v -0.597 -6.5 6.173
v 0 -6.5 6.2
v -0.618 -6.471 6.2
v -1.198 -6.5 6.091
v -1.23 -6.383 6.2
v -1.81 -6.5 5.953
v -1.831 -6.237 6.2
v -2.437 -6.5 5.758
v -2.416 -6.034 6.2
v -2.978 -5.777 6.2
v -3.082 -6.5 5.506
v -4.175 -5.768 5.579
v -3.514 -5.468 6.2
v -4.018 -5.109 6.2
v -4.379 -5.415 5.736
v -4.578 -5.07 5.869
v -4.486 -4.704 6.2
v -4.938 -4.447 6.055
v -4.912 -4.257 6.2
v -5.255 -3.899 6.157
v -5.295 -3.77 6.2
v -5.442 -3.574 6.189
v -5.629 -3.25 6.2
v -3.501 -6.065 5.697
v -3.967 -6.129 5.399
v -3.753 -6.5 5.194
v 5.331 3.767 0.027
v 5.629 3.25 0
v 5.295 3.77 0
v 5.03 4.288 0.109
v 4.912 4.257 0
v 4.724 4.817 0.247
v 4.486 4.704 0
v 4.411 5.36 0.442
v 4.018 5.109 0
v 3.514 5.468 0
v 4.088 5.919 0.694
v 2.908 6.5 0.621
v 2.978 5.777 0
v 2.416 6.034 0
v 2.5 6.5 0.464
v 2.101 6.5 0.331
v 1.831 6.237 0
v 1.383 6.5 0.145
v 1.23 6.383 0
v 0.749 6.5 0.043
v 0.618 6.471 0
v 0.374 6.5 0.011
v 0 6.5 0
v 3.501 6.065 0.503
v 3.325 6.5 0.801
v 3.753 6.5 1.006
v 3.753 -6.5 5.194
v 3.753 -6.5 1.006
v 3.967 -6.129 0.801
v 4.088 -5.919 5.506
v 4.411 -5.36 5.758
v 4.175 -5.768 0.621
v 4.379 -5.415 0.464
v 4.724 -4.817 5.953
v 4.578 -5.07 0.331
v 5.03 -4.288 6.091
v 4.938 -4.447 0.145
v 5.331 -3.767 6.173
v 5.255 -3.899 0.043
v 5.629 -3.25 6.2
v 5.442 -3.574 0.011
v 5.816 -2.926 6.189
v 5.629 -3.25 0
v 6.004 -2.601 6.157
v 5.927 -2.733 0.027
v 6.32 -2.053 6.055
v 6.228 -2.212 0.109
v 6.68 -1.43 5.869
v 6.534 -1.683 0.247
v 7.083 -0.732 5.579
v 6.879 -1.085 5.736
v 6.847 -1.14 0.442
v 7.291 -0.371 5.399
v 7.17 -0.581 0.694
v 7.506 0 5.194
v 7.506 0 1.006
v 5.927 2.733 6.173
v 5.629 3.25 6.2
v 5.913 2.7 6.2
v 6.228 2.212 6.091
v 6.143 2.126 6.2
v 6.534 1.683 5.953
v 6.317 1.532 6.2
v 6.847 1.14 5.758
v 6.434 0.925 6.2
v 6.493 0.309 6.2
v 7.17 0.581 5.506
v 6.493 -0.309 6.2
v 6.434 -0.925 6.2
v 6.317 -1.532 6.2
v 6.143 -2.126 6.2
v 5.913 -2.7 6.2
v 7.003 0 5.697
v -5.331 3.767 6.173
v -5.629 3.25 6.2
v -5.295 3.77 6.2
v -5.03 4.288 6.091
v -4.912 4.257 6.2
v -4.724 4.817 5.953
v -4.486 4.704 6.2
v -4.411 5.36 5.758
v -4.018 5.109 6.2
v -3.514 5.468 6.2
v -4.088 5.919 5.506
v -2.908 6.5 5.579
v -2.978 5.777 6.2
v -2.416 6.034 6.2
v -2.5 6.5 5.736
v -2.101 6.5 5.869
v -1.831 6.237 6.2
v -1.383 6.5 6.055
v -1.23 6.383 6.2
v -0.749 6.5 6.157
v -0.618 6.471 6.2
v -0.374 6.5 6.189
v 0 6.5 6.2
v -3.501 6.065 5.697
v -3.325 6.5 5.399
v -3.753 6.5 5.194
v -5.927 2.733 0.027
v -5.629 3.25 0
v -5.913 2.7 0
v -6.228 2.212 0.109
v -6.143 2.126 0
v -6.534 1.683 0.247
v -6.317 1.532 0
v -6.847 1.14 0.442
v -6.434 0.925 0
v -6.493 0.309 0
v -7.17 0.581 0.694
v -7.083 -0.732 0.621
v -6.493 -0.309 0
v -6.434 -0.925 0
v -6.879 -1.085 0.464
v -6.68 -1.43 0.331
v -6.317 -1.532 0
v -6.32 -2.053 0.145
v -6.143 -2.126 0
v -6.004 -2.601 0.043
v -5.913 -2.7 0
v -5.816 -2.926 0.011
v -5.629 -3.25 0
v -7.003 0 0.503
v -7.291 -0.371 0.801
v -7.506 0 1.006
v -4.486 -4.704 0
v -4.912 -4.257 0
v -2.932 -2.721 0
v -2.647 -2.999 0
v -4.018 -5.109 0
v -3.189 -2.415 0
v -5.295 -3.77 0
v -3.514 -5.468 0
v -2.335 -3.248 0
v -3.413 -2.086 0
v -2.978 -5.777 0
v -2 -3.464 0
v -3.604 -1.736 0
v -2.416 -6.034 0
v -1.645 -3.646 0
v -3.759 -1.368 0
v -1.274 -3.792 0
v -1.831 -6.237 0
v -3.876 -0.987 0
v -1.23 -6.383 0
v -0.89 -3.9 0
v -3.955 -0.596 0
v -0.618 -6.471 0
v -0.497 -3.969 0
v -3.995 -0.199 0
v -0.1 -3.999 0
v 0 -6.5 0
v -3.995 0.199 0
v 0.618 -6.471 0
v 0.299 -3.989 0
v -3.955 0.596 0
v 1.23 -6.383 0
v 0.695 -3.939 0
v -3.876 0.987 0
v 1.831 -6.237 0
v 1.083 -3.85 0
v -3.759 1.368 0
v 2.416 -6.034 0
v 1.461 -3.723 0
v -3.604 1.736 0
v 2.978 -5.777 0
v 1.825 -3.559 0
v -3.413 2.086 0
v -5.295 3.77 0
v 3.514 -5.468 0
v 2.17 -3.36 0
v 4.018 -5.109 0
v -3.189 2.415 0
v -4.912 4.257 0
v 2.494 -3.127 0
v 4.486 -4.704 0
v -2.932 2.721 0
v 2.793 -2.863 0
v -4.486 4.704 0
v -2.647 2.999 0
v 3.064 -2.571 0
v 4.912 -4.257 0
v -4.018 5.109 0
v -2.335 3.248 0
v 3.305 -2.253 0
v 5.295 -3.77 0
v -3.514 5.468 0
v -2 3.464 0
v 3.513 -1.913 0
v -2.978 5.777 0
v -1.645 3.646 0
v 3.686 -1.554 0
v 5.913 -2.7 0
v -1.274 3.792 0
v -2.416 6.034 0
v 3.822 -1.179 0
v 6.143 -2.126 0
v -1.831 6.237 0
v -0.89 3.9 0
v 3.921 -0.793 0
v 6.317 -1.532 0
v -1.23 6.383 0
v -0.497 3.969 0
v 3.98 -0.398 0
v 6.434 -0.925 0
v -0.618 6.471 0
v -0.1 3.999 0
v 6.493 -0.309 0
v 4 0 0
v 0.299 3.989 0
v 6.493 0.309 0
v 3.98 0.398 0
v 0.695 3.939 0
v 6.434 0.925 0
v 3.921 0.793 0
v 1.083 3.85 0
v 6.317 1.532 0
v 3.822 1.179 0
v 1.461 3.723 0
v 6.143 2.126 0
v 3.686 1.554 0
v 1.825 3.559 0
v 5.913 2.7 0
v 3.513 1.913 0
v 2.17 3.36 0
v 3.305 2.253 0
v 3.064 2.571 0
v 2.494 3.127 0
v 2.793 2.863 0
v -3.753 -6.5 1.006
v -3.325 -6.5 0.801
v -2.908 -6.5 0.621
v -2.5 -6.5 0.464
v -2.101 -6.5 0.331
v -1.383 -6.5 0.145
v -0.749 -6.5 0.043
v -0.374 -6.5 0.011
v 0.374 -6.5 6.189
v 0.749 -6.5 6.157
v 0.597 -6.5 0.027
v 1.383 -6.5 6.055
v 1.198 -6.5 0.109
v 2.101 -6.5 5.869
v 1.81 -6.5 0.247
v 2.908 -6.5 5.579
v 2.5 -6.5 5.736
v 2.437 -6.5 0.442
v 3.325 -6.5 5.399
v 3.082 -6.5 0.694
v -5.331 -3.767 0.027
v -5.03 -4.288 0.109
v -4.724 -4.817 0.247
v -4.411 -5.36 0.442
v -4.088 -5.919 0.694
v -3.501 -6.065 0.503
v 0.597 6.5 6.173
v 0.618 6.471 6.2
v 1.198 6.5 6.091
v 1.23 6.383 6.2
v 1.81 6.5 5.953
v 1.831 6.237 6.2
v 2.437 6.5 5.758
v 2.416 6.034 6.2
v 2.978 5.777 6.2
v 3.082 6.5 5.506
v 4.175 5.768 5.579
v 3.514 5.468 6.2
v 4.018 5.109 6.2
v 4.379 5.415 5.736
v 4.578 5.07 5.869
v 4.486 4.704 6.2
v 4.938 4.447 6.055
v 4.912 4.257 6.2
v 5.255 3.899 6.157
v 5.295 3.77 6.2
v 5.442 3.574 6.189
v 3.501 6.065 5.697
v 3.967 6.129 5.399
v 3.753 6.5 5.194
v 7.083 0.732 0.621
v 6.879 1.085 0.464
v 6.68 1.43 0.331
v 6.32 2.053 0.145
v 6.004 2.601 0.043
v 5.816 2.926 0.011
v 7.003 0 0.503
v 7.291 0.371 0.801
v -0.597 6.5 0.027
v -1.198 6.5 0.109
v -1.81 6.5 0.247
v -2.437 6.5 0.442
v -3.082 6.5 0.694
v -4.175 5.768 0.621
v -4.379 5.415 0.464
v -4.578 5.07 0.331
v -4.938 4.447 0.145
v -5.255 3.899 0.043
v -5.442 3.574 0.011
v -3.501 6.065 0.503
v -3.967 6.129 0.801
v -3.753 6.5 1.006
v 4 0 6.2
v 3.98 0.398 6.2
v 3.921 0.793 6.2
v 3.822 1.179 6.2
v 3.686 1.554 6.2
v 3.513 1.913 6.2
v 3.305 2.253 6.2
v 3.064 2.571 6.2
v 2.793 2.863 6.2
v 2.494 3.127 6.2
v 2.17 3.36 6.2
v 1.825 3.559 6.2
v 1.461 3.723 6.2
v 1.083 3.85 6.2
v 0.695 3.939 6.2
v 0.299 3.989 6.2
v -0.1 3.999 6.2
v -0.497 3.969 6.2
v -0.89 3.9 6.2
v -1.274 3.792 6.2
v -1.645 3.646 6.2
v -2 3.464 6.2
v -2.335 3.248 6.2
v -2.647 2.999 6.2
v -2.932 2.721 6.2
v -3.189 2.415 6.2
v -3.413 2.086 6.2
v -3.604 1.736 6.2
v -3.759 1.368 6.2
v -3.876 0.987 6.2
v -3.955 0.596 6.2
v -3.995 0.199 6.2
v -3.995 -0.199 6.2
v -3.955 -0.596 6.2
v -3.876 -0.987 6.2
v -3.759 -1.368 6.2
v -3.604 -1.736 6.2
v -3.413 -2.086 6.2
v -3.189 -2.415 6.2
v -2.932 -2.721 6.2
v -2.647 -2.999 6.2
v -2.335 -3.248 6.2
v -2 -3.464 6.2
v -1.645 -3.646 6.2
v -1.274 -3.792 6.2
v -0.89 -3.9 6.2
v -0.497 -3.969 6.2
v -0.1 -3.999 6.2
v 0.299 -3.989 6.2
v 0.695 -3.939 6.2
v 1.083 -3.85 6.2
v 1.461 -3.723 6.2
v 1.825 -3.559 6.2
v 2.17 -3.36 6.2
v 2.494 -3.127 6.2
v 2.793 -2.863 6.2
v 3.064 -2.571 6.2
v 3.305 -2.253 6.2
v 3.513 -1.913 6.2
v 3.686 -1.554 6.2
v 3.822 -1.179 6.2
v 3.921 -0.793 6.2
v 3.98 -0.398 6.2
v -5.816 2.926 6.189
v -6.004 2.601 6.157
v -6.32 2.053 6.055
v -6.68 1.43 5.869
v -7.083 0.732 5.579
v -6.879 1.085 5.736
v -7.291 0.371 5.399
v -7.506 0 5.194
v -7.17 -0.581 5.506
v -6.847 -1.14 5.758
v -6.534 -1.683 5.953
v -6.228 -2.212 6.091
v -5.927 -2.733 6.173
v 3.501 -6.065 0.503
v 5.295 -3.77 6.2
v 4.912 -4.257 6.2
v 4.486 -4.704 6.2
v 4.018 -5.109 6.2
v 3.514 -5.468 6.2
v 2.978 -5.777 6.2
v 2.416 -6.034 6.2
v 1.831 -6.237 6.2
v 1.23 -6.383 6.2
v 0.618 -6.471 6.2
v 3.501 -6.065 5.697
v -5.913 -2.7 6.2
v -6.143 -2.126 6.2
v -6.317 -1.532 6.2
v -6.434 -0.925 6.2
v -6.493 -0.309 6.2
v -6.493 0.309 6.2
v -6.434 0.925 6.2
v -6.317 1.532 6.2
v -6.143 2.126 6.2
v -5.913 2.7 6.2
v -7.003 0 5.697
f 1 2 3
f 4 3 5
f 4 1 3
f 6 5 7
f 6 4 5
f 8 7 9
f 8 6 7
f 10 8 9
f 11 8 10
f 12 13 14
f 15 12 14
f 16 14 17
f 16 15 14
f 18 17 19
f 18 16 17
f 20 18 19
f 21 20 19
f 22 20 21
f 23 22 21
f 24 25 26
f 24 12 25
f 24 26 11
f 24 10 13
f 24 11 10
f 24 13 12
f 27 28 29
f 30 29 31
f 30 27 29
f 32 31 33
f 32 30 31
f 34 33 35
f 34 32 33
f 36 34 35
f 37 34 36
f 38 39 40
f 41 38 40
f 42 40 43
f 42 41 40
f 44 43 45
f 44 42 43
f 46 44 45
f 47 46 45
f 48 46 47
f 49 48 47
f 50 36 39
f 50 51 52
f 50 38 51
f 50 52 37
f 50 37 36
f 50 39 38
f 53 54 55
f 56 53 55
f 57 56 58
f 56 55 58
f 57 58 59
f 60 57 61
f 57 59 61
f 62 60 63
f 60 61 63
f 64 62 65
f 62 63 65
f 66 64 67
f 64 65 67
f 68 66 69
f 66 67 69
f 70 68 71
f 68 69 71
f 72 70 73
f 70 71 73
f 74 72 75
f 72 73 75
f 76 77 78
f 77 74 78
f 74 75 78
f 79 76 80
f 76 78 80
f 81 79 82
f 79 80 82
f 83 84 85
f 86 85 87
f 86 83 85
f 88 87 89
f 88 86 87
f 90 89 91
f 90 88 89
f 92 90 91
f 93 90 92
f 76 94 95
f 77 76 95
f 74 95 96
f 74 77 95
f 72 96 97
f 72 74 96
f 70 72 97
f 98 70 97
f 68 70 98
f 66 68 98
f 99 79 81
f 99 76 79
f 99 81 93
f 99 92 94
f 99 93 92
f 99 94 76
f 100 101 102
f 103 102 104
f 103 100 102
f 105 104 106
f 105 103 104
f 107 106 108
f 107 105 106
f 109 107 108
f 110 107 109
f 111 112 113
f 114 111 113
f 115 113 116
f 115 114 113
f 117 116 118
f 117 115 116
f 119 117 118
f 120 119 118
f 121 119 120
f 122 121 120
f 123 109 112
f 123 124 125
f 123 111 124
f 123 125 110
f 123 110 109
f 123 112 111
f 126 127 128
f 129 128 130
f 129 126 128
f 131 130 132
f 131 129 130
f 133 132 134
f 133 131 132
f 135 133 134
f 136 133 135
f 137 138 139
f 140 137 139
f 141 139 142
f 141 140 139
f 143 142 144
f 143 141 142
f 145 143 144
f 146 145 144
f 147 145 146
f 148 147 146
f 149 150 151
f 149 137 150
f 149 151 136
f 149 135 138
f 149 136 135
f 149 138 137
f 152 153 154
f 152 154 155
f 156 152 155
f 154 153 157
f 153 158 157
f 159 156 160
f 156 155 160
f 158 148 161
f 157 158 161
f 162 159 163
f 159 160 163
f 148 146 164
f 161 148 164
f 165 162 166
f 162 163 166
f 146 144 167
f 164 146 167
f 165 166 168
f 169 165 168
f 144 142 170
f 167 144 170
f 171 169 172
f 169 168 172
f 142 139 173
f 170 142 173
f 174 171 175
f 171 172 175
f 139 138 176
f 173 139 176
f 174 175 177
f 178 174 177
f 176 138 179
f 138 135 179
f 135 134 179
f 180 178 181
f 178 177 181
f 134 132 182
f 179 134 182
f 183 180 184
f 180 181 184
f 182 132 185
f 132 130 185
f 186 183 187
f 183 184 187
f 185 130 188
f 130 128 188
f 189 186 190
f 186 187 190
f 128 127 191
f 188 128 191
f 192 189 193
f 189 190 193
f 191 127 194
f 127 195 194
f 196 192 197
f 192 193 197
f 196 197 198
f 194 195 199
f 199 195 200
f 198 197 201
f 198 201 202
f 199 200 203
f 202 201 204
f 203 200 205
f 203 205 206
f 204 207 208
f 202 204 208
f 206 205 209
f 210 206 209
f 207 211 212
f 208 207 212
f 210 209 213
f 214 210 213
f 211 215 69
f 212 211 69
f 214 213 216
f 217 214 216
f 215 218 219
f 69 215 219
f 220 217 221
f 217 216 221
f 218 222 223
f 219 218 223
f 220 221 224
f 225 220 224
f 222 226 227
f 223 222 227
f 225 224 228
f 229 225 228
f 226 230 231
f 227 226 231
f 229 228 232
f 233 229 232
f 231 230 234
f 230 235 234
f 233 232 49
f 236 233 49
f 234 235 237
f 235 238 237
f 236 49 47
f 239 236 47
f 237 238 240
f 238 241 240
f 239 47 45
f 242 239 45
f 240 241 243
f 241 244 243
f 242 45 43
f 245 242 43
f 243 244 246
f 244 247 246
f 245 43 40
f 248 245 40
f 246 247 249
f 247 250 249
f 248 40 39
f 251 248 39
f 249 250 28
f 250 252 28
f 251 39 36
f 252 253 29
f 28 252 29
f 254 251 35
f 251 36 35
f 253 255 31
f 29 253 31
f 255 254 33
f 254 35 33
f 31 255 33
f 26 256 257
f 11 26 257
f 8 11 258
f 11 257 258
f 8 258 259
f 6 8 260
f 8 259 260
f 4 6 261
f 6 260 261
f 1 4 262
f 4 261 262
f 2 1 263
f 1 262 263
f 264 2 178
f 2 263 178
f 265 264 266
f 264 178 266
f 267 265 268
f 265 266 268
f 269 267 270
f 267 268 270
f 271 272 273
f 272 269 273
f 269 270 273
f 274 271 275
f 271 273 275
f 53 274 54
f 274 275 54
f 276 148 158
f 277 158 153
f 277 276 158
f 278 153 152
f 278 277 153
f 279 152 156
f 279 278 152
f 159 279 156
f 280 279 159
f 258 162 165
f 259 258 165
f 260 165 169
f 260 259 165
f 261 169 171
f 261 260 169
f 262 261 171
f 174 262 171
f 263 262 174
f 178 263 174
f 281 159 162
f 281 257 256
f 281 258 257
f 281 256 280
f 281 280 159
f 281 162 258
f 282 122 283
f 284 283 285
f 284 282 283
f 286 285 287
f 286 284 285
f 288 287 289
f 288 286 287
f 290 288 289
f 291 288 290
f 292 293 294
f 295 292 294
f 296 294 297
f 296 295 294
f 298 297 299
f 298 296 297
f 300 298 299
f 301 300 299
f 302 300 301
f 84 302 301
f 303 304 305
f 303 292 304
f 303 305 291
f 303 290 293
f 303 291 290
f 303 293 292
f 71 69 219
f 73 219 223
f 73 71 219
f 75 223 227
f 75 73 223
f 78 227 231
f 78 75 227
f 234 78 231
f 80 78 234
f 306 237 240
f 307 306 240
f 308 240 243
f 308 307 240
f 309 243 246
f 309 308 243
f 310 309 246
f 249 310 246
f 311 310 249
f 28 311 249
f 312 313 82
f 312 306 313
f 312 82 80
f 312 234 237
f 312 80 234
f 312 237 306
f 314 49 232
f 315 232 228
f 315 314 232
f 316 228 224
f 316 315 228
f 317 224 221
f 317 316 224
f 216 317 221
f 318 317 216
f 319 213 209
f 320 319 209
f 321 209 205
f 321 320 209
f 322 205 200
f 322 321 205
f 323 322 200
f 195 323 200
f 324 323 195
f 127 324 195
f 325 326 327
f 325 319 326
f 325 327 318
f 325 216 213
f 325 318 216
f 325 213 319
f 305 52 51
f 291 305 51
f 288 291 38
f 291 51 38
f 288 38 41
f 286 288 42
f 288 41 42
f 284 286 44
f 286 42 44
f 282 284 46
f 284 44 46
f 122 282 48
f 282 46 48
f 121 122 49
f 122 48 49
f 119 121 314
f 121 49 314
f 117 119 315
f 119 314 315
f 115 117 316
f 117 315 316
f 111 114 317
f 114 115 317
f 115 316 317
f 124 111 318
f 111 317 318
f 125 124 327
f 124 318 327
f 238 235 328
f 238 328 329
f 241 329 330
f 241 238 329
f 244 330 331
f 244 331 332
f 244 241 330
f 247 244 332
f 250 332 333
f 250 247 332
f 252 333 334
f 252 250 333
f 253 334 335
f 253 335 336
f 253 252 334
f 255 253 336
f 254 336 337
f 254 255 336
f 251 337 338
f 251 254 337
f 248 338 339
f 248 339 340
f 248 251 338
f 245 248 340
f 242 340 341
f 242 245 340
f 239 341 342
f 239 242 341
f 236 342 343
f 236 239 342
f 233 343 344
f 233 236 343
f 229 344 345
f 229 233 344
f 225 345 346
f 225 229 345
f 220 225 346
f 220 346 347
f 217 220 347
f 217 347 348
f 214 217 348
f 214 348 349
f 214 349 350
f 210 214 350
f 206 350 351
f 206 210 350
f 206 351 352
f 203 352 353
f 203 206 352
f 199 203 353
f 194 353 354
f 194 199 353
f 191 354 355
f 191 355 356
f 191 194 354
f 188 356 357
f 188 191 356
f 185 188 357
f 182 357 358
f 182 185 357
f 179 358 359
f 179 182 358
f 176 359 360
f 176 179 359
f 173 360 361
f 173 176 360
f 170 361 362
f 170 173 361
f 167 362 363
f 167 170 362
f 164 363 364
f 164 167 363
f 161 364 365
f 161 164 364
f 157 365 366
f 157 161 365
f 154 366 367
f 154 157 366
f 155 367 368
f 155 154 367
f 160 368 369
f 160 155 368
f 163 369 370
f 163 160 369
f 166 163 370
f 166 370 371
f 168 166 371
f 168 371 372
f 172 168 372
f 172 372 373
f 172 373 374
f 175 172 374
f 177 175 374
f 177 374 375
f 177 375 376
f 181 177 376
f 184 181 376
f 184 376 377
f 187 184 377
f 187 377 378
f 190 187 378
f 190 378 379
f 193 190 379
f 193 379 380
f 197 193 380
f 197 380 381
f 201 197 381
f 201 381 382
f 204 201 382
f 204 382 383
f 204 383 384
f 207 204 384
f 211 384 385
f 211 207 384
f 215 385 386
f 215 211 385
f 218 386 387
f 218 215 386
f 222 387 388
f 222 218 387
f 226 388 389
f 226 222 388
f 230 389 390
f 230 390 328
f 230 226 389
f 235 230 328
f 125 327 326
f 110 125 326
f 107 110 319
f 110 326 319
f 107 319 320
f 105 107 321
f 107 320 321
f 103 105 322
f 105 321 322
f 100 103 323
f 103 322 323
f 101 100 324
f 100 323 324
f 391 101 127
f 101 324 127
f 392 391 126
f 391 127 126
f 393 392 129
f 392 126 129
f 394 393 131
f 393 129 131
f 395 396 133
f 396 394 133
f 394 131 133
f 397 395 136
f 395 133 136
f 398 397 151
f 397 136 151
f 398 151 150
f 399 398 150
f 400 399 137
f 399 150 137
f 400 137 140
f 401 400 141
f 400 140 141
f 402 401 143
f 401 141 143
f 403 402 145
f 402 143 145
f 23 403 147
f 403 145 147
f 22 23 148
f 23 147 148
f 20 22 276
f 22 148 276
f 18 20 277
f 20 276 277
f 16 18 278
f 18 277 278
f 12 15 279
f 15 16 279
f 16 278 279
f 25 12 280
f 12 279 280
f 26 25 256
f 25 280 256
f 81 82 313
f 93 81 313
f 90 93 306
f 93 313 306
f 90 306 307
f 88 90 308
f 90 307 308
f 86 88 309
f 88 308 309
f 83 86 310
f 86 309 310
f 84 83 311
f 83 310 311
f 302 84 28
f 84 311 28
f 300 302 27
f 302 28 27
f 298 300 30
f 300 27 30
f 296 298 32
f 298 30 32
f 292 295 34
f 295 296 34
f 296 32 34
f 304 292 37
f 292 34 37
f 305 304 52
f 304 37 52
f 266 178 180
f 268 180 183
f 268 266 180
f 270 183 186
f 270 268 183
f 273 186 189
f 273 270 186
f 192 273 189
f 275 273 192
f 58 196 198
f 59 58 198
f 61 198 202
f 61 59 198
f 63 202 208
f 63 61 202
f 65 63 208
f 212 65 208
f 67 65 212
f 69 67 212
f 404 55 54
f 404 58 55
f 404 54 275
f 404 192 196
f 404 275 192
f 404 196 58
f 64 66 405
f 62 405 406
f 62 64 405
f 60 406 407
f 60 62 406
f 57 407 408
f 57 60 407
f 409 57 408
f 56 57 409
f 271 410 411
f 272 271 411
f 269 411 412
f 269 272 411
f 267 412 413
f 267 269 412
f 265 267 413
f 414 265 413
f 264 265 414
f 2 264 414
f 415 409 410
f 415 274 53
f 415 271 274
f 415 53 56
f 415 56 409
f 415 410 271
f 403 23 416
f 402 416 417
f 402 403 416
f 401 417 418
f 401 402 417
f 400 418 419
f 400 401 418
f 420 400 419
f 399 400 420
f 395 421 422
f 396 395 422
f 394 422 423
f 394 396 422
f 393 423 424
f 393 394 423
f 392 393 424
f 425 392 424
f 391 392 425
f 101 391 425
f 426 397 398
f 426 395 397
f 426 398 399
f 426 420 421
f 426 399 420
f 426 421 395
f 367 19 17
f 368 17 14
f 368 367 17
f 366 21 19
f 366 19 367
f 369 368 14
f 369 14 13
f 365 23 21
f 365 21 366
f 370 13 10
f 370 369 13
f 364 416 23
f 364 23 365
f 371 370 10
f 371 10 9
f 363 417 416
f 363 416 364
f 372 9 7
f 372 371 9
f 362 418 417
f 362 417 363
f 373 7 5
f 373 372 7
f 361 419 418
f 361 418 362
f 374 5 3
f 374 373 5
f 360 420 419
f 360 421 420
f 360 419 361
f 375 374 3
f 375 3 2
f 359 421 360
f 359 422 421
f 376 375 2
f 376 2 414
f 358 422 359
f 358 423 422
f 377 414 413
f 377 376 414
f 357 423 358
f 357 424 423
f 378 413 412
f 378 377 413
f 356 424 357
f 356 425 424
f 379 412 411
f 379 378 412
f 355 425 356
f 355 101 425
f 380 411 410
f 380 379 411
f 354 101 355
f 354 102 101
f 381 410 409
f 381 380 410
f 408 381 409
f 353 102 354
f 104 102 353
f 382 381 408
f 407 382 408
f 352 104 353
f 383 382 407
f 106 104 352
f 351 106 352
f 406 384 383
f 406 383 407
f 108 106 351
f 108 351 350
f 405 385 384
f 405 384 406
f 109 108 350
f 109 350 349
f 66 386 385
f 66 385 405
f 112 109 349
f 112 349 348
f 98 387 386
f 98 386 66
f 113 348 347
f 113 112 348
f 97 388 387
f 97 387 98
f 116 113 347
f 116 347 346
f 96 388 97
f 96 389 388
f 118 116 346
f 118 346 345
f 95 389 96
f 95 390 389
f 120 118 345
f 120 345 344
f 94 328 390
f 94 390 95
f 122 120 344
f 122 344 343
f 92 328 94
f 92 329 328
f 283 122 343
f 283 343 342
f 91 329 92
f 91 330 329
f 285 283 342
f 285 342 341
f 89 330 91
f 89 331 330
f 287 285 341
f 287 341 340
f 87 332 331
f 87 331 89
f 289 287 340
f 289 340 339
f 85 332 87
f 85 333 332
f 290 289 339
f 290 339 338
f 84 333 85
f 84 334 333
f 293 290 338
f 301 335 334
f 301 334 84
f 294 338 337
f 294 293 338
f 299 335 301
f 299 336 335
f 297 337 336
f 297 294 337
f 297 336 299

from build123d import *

# Parameters (mm, degrees)
ESBO_O1_R                = 4
RESSALTO_EXTRUS_O1_DEPTH = 6.2
ESBO_O2_OUTSIDE_W        = 33.572
ESBO_O2_OUTSIDE_H        = 31.56
ESBO_O2_OUTSIDE_R        = 6.5
CORTE_EXTRUS_O1_DEPTH    = 6.2
CORTE_EXTRUS_O1_TAPER    = 45
ESBO_O3_OUTSIDE_W        = 33.572
ESBO_O3_OUTSIDE_H        = 31.56
ESBO_O3_OUTSIDE_R        = 6.5
CORTE_EXTRUS_O2_DEPTH    = 6.2
CORTE_EXTRUS_O2_TAPER    = 45


with BuildPart() as part:
    # Esboço1 → Ressalto-extrusão1 (new body)
    with BuildSketch(Plane.XY):
        Polygon((3.75277675, -6.5), (7.505553499, 0), (3.75277675, 6.5), (-3.75277675, 6.5), (-7.505553499, 0), (-3.75277675, -6.5), align=None)
        Circle(ESBO_O1_R, mode=Mode.SUBTRACT)
    extrude(amount=RESSALTO_EXTRUS_O1_DEPTH)

    # Esboço2 outside → Corte-extrusão1 (cut)
    with BuildSketch(Plane.XY.offset(6.2)):
        Rectangle(ESBO_O2_OUTSIDE_W, ESBO_O2_OUTSIDE_H)
        Circle(ESBO_O2_OUTSIDE_R, mode=Mode.SUBTRACT)
    extrude(amount=-CORTE_EXTRUS_O1_DEPTH, taper=CORTE_EXTRUS_O1_TAPER, mode=Mode.SUBTRACT)

    # Esboço3 outside → Corte-extrusão2 (cut)
    with BuildSketch(Plane(origin=(0, 0, 0), x_dir=(-1, 0, 0), z_dir=(0, 0, -1))):
        Rectangle(ESBO_O3_OUTSIDE_W, ESBO_O3_OUTSIDE_H)
        Circle(ESBO_O3_OUTSIDE_R, mode=Mode.SUBTRACT)
    extrude(amount=-CORTE_EXTRUS_O2_DEPTH, taper=CORTE_EXTRUS_O2_TAPER, mode=Mode.SUBTRACT)


solid = part.part
